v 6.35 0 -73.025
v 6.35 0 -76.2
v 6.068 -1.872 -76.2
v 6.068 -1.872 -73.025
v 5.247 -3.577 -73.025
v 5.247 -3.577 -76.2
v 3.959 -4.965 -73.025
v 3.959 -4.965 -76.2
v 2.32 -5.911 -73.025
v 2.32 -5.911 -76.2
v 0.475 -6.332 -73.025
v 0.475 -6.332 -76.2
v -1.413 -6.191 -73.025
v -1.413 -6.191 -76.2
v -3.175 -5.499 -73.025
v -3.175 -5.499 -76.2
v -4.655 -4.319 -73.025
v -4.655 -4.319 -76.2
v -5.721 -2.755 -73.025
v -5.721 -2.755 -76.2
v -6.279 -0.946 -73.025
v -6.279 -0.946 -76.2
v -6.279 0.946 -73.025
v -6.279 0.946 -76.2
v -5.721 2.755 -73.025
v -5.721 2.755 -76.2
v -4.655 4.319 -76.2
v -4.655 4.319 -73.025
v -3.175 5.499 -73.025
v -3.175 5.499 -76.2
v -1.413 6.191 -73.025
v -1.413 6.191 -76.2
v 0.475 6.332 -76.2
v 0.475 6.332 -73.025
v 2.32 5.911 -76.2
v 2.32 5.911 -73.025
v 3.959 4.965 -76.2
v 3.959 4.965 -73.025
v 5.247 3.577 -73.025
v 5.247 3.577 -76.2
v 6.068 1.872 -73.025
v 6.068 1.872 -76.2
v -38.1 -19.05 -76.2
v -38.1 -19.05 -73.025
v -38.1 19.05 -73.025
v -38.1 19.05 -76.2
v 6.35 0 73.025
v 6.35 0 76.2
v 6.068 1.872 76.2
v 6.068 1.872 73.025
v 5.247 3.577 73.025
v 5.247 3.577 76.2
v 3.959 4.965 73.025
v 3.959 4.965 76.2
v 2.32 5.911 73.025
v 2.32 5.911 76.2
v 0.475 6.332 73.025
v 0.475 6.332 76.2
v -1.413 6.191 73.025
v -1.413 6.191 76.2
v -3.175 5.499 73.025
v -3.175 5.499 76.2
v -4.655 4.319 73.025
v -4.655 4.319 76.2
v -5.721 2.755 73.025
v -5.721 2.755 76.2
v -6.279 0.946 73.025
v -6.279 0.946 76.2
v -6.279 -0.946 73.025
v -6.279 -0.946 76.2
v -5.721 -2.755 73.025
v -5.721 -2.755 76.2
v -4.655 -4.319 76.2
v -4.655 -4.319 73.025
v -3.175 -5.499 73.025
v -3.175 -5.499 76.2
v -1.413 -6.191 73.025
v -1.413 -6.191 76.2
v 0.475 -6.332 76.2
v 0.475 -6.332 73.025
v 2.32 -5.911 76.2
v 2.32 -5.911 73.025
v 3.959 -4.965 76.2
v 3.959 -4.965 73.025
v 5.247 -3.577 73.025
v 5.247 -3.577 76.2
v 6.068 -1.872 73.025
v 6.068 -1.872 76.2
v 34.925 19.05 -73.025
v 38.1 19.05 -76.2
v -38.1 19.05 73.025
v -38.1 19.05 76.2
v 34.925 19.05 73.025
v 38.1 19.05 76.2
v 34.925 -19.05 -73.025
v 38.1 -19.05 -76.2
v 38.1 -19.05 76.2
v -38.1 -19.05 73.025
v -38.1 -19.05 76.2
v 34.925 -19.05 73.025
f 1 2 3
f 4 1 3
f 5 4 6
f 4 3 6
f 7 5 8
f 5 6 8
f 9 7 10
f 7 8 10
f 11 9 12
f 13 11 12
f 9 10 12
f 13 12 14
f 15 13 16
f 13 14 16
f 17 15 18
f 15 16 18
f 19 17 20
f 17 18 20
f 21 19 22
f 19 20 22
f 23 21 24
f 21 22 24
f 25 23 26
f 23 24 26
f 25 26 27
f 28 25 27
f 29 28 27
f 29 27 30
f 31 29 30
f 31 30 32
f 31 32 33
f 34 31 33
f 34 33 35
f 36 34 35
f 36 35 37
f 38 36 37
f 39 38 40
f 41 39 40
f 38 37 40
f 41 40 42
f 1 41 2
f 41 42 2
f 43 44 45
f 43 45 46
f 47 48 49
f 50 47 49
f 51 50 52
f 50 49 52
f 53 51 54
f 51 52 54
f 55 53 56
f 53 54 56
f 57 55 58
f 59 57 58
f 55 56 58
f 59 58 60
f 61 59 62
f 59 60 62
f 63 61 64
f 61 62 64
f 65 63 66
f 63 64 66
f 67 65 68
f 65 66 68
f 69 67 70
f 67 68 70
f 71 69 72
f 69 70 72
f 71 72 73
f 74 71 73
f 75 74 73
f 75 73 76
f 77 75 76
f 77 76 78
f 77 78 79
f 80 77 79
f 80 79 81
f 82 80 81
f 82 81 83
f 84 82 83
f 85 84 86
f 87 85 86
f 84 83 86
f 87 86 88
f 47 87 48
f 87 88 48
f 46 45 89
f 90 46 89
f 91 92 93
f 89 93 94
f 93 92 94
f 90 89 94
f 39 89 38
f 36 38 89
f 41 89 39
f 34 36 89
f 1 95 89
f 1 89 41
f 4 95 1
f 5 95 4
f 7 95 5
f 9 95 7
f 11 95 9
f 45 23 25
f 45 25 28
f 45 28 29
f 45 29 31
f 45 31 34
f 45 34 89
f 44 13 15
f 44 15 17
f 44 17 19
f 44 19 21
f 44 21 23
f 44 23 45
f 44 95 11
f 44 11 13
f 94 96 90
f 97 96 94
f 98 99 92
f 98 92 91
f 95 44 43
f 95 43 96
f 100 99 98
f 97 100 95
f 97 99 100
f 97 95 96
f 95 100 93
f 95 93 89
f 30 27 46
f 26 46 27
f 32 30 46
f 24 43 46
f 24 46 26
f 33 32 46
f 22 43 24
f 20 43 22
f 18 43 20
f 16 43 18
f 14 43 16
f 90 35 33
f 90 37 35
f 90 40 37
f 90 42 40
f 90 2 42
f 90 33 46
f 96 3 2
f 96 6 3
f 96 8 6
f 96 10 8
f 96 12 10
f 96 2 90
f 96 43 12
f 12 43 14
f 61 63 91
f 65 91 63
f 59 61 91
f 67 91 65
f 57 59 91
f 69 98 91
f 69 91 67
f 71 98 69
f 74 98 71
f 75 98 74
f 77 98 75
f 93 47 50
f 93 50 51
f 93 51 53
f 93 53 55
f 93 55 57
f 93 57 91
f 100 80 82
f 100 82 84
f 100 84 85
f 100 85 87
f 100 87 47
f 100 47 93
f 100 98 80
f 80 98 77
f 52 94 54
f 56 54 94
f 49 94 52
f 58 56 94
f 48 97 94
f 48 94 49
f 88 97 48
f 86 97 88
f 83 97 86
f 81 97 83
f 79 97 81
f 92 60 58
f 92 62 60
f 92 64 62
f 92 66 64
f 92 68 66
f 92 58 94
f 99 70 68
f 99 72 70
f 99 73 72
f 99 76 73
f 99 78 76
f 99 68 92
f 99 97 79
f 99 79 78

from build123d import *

# Parameters (mm, degrees)
F1_DEPTH = 19.05
F2_R     = 6.35
F3_DEPTH = 3.175
F4_R     = 6.35
F5_DEPTH = 3.175


with BuildPart() as f1:
    # F0 (on Front) → F1 (new body, symmetric)
    with BuildSketch(Plane.XZ):
        Polygon((38.1, 76.2), (-38.1, 76.2), (-38.1, 73.025), (34.925, 73.025), (34.925, -73.025), (-38.1, -73.025), (-38.1, -76.2), (38.1, -76.2), align=None)
    extrude(amount=F1_DEPTH, both=True)

    # F2 (on face) → F3 (cut, symmetric)
    with BuildSketch(Plane.XY.offset(76.2)):
        Circle(F2_R)
    extrude(amount=F3_DEPTH, both=True, mode=Mode.SUBTRACT)

    # F4 (on face) → F5 (cut, symmetric)
    with BuildSketch(Plane(origin=(0, 0, -76.2), x_dir=(1, 0, 0), z_dir=(0, 0, -1))):
        Circle(F4_R)
    extrude(amount=F5_DEPTH, both=True, mode=Mode.SUBTRACT)


solid = f1.part
